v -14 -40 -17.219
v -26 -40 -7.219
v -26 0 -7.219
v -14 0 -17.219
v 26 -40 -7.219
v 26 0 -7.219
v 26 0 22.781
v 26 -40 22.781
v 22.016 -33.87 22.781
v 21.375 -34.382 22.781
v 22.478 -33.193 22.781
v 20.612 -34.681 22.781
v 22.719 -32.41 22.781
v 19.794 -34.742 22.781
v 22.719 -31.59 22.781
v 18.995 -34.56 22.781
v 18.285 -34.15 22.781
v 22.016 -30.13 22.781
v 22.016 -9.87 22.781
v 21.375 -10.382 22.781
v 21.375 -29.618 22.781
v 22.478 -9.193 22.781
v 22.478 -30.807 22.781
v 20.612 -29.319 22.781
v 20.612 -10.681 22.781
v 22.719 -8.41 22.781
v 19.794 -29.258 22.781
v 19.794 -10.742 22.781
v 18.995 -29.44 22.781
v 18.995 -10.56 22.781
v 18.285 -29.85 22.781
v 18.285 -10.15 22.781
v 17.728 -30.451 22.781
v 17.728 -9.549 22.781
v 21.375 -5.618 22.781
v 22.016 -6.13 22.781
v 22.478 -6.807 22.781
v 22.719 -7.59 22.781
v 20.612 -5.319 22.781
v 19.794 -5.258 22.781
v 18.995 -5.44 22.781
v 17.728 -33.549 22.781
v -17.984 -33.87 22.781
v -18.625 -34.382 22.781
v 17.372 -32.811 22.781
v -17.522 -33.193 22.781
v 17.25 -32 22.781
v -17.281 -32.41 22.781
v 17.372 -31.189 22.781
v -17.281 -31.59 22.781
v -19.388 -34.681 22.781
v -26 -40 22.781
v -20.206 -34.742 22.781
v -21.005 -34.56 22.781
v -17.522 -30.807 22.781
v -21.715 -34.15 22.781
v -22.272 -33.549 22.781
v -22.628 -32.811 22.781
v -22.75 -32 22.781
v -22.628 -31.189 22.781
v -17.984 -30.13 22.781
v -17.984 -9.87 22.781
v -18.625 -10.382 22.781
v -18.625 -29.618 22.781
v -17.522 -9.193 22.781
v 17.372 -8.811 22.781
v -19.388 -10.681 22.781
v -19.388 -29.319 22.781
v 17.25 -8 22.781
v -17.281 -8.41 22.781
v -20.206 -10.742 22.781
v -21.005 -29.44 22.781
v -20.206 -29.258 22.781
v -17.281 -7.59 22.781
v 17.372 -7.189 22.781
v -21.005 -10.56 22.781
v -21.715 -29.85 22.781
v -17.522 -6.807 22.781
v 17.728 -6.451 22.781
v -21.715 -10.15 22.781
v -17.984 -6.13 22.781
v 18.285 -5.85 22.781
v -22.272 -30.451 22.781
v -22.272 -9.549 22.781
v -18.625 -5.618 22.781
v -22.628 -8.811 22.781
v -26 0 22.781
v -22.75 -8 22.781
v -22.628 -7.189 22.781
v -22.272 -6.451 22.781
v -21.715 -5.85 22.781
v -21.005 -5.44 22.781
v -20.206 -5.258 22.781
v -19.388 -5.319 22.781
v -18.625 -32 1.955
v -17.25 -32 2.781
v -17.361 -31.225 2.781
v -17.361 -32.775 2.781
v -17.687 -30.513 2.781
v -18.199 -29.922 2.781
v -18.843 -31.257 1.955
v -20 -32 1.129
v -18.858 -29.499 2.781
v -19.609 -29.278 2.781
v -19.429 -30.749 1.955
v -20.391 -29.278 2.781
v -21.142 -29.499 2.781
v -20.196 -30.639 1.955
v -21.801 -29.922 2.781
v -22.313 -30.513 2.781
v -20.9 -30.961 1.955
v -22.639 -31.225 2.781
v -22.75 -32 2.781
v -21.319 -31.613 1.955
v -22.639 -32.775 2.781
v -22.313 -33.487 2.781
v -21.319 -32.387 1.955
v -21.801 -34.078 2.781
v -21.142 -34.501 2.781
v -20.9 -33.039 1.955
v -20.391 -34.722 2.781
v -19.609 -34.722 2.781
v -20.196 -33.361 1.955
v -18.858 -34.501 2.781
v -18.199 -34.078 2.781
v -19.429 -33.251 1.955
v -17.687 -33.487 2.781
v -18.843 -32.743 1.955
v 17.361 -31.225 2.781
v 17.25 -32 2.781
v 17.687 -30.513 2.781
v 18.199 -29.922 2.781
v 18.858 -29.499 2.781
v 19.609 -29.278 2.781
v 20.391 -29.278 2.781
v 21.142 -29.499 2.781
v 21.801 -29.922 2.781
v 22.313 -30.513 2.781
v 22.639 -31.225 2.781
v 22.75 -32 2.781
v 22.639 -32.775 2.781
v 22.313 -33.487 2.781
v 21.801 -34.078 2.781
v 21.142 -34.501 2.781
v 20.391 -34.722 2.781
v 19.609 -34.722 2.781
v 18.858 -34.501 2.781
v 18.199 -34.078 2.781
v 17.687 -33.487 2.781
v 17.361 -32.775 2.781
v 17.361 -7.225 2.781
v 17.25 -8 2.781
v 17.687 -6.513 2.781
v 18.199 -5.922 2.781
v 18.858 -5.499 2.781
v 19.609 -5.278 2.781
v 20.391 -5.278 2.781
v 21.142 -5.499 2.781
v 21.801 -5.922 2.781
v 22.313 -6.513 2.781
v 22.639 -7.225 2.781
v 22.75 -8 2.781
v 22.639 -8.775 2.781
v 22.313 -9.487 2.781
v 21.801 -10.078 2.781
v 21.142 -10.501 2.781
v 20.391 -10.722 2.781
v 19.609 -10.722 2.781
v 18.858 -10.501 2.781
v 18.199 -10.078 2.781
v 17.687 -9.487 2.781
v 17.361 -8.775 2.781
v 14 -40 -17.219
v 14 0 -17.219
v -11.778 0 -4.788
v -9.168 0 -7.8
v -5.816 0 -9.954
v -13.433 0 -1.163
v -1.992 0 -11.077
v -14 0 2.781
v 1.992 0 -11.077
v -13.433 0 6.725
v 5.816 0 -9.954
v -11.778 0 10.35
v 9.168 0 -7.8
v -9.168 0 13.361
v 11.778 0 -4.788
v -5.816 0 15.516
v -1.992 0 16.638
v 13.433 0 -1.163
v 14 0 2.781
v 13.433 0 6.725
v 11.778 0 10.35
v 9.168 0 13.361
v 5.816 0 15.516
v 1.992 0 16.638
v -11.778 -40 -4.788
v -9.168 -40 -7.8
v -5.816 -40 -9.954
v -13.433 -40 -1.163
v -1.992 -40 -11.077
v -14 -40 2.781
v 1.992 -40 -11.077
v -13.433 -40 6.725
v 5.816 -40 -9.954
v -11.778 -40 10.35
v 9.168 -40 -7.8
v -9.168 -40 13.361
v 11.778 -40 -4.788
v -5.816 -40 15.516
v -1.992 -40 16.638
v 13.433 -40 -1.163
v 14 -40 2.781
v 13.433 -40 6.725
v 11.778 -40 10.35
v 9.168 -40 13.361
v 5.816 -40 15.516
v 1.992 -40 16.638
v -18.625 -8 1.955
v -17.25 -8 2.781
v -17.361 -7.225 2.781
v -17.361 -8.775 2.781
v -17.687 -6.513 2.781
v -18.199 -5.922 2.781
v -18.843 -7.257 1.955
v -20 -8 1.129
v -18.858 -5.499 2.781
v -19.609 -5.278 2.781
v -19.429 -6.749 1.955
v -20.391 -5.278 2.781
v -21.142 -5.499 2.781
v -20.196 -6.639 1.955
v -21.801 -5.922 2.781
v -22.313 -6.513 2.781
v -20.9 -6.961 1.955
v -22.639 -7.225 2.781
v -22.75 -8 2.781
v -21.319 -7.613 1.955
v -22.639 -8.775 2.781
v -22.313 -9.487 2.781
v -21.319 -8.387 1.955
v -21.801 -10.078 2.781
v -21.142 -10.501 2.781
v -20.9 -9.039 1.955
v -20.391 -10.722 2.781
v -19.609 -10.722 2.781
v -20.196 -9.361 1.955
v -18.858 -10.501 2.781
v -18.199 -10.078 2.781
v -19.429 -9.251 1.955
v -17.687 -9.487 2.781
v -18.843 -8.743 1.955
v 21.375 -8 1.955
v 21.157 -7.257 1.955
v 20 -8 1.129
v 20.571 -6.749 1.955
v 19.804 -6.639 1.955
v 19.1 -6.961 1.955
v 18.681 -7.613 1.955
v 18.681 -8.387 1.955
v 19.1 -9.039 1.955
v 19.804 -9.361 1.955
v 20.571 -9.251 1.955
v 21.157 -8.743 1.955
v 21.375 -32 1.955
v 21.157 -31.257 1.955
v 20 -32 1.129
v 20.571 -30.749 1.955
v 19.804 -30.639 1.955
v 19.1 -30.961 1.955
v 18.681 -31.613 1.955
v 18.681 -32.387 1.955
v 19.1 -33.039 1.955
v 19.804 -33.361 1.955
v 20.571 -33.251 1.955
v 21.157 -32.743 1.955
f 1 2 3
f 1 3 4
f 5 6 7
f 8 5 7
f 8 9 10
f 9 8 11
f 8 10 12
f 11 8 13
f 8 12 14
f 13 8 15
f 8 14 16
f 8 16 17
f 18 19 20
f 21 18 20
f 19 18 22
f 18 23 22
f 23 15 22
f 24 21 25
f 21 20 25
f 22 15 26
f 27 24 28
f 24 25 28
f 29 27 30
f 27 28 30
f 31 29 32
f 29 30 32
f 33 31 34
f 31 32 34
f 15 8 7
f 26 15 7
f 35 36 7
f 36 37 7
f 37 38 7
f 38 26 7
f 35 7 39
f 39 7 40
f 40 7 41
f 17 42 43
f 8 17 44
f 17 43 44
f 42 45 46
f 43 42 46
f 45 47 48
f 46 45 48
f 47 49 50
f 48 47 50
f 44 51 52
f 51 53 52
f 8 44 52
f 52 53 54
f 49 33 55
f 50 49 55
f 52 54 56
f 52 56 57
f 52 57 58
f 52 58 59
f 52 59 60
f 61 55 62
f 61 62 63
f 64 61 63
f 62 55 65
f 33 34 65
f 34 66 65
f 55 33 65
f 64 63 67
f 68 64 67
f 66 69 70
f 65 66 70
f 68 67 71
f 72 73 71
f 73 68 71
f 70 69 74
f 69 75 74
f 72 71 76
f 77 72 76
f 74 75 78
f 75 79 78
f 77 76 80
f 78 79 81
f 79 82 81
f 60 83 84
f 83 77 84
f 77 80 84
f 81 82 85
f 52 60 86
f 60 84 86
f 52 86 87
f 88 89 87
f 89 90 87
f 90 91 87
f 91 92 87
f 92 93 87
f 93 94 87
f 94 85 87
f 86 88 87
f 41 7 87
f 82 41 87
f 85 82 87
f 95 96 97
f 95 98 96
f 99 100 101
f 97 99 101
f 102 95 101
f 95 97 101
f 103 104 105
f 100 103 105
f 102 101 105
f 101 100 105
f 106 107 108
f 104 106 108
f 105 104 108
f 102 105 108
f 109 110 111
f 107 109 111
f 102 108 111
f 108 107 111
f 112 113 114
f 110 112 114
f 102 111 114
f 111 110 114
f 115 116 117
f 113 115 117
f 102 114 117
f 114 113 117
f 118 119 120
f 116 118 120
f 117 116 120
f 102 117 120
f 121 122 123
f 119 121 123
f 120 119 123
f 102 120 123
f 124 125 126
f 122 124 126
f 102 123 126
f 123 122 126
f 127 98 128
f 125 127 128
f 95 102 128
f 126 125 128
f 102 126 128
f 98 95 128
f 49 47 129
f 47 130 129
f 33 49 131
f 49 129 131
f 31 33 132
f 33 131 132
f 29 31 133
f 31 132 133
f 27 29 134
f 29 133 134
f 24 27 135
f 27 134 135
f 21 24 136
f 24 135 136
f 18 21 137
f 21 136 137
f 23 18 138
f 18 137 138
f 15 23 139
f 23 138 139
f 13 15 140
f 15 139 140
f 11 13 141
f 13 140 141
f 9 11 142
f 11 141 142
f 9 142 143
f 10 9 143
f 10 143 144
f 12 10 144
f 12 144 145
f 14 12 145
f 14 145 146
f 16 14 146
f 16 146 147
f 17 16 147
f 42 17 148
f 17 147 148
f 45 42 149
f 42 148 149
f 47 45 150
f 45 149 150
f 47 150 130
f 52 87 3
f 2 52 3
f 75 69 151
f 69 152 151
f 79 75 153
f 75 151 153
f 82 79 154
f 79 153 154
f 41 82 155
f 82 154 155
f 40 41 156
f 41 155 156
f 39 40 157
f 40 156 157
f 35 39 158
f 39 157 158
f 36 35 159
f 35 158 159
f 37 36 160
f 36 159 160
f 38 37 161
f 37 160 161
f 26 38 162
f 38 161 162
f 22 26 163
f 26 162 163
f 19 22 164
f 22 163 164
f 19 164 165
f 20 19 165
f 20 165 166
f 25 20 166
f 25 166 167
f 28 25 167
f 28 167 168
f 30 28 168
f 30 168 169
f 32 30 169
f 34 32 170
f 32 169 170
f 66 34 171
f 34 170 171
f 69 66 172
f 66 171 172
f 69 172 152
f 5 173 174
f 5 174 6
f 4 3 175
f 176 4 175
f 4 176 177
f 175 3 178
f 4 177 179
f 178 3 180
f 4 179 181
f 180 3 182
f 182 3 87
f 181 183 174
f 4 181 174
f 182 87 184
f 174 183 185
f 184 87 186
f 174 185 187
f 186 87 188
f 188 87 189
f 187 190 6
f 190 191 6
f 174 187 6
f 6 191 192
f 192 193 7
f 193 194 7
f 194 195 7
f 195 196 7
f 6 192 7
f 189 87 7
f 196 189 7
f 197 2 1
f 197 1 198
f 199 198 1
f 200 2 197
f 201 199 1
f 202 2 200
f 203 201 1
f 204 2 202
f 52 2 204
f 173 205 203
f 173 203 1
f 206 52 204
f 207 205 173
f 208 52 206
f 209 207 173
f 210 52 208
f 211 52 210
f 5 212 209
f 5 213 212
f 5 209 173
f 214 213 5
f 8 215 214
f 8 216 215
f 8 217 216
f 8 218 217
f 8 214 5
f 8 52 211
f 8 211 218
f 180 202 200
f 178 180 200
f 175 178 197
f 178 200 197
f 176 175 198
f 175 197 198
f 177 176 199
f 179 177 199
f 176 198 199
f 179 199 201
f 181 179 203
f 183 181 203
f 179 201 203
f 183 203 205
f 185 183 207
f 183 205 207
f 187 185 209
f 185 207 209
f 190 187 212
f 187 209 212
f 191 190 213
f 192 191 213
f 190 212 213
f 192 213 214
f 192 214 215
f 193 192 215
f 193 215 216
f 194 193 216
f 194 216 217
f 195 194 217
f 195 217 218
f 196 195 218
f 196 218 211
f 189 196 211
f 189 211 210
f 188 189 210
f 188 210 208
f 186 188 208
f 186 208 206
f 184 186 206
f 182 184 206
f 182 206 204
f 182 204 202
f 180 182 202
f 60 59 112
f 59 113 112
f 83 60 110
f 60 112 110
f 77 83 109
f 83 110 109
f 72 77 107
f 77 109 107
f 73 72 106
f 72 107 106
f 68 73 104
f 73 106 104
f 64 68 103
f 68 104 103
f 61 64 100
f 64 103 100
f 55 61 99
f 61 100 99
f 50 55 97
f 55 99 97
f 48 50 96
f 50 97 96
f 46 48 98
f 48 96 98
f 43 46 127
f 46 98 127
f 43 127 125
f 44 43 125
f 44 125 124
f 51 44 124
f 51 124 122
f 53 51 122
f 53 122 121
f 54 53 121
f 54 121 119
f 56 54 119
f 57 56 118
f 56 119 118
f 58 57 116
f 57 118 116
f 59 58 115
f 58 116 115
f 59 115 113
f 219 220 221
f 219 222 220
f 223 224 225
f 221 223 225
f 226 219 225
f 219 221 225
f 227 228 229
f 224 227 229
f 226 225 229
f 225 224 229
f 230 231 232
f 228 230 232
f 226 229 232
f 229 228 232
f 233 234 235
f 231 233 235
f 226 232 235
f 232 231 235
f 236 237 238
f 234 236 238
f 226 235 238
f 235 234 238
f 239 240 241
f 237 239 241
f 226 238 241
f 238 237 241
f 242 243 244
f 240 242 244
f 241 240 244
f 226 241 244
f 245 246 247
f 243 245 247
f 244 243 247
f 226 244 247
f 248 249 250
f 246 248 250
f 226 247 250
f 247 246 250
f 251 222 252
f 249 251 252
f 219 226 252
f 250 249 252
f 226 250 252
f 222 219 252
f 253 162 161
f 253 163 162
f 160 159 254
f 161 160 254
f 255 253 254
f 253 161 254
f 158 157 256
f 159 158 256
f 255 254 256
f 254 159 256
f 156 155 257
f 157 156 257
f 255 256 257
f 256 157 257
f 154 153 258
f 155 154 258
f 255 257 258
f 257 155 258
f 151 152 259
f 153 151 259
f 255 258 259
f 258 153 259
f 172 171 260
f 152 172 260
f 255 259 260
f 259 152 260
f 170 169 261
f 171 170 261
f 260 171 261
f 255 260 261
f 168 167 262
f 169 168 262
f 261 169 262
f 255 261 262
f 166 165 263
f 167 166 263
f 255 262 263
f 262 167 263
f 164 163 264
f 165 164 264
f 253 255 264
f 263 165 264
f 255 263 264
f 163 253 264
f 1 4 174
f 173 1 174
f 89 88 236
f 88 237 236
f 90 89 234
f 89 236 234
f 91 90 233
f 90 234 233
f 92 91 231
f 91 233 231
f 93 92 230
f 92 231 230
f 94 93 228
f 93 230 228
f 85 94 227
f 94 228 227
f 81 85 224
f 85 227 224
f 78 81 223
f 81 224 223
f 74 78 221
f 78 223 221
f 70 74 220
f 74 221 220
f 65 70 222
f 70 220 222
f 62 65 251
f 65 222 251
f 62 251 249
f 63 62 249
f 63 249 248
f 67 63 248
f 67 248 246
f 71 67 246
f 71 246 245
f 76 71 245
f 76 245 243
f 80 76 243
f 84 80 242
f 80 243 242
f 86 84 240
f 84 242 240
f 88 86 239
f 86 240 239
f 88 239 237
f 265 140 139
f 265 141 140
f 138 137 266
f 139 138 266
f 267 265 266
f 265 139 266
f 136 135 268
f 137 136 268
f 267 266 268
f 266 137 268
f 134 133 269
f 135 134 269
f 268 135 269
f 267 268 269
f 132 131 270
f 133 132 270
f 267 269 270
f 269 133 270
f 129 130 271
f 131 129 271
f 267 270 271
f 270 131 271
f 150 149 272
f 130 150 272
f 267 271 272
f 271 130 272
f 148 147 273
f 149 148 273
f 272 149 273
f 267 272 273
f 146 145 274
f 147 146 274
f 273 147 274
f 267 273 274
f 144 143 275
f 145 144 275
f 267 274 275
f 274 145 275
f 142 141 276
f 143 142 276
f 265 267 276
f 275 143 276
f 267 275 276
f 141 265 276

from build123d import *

# Parameters (mm, degrees)
F1_DEPTH = 40
F2_D     = 28
F4_D     = 5.5
F4_DEPTH = 20
F4_TIP   = 1.6523667023


with BuildPart() as f1:
    # F0 (on Front) → F1 (new body)
    with BuildSketch(Plane.XZ):
        Polygon((26, 22.7809774678), (-26, 22.7809774678), (-26, -7.2190225322), (-14, -17.2190225322), (14, -17.2190225322), (26, -7.2190225322), align=None)
    extrude(amount=F1_DEPTH)

    # F2 (through all)
    with Locations(Plane(origin=(0, 0, 0), x_dir=(1, 0, 0), z_dir=(0, 1, 0))):
        with Locations((0, -2.7809774678)):
            Hole(F2_D / 2)

    # F4
    with Locations(Plane.XY.offset(22.7809774678)):
        with Locations((-20, -8), (-20, -32), (20, -32), (20, -8)):
            Hole(F4_D / 2, depth=F4_DEPTH)
            with Locations((0, 0, -(F4_DEPTH + F4_TIP / 2))):  # 118° drill point
                Cone(0, F4_D / 2, F4_TIP, mode=Mode.SUBTRACT)


solid = f1.part
